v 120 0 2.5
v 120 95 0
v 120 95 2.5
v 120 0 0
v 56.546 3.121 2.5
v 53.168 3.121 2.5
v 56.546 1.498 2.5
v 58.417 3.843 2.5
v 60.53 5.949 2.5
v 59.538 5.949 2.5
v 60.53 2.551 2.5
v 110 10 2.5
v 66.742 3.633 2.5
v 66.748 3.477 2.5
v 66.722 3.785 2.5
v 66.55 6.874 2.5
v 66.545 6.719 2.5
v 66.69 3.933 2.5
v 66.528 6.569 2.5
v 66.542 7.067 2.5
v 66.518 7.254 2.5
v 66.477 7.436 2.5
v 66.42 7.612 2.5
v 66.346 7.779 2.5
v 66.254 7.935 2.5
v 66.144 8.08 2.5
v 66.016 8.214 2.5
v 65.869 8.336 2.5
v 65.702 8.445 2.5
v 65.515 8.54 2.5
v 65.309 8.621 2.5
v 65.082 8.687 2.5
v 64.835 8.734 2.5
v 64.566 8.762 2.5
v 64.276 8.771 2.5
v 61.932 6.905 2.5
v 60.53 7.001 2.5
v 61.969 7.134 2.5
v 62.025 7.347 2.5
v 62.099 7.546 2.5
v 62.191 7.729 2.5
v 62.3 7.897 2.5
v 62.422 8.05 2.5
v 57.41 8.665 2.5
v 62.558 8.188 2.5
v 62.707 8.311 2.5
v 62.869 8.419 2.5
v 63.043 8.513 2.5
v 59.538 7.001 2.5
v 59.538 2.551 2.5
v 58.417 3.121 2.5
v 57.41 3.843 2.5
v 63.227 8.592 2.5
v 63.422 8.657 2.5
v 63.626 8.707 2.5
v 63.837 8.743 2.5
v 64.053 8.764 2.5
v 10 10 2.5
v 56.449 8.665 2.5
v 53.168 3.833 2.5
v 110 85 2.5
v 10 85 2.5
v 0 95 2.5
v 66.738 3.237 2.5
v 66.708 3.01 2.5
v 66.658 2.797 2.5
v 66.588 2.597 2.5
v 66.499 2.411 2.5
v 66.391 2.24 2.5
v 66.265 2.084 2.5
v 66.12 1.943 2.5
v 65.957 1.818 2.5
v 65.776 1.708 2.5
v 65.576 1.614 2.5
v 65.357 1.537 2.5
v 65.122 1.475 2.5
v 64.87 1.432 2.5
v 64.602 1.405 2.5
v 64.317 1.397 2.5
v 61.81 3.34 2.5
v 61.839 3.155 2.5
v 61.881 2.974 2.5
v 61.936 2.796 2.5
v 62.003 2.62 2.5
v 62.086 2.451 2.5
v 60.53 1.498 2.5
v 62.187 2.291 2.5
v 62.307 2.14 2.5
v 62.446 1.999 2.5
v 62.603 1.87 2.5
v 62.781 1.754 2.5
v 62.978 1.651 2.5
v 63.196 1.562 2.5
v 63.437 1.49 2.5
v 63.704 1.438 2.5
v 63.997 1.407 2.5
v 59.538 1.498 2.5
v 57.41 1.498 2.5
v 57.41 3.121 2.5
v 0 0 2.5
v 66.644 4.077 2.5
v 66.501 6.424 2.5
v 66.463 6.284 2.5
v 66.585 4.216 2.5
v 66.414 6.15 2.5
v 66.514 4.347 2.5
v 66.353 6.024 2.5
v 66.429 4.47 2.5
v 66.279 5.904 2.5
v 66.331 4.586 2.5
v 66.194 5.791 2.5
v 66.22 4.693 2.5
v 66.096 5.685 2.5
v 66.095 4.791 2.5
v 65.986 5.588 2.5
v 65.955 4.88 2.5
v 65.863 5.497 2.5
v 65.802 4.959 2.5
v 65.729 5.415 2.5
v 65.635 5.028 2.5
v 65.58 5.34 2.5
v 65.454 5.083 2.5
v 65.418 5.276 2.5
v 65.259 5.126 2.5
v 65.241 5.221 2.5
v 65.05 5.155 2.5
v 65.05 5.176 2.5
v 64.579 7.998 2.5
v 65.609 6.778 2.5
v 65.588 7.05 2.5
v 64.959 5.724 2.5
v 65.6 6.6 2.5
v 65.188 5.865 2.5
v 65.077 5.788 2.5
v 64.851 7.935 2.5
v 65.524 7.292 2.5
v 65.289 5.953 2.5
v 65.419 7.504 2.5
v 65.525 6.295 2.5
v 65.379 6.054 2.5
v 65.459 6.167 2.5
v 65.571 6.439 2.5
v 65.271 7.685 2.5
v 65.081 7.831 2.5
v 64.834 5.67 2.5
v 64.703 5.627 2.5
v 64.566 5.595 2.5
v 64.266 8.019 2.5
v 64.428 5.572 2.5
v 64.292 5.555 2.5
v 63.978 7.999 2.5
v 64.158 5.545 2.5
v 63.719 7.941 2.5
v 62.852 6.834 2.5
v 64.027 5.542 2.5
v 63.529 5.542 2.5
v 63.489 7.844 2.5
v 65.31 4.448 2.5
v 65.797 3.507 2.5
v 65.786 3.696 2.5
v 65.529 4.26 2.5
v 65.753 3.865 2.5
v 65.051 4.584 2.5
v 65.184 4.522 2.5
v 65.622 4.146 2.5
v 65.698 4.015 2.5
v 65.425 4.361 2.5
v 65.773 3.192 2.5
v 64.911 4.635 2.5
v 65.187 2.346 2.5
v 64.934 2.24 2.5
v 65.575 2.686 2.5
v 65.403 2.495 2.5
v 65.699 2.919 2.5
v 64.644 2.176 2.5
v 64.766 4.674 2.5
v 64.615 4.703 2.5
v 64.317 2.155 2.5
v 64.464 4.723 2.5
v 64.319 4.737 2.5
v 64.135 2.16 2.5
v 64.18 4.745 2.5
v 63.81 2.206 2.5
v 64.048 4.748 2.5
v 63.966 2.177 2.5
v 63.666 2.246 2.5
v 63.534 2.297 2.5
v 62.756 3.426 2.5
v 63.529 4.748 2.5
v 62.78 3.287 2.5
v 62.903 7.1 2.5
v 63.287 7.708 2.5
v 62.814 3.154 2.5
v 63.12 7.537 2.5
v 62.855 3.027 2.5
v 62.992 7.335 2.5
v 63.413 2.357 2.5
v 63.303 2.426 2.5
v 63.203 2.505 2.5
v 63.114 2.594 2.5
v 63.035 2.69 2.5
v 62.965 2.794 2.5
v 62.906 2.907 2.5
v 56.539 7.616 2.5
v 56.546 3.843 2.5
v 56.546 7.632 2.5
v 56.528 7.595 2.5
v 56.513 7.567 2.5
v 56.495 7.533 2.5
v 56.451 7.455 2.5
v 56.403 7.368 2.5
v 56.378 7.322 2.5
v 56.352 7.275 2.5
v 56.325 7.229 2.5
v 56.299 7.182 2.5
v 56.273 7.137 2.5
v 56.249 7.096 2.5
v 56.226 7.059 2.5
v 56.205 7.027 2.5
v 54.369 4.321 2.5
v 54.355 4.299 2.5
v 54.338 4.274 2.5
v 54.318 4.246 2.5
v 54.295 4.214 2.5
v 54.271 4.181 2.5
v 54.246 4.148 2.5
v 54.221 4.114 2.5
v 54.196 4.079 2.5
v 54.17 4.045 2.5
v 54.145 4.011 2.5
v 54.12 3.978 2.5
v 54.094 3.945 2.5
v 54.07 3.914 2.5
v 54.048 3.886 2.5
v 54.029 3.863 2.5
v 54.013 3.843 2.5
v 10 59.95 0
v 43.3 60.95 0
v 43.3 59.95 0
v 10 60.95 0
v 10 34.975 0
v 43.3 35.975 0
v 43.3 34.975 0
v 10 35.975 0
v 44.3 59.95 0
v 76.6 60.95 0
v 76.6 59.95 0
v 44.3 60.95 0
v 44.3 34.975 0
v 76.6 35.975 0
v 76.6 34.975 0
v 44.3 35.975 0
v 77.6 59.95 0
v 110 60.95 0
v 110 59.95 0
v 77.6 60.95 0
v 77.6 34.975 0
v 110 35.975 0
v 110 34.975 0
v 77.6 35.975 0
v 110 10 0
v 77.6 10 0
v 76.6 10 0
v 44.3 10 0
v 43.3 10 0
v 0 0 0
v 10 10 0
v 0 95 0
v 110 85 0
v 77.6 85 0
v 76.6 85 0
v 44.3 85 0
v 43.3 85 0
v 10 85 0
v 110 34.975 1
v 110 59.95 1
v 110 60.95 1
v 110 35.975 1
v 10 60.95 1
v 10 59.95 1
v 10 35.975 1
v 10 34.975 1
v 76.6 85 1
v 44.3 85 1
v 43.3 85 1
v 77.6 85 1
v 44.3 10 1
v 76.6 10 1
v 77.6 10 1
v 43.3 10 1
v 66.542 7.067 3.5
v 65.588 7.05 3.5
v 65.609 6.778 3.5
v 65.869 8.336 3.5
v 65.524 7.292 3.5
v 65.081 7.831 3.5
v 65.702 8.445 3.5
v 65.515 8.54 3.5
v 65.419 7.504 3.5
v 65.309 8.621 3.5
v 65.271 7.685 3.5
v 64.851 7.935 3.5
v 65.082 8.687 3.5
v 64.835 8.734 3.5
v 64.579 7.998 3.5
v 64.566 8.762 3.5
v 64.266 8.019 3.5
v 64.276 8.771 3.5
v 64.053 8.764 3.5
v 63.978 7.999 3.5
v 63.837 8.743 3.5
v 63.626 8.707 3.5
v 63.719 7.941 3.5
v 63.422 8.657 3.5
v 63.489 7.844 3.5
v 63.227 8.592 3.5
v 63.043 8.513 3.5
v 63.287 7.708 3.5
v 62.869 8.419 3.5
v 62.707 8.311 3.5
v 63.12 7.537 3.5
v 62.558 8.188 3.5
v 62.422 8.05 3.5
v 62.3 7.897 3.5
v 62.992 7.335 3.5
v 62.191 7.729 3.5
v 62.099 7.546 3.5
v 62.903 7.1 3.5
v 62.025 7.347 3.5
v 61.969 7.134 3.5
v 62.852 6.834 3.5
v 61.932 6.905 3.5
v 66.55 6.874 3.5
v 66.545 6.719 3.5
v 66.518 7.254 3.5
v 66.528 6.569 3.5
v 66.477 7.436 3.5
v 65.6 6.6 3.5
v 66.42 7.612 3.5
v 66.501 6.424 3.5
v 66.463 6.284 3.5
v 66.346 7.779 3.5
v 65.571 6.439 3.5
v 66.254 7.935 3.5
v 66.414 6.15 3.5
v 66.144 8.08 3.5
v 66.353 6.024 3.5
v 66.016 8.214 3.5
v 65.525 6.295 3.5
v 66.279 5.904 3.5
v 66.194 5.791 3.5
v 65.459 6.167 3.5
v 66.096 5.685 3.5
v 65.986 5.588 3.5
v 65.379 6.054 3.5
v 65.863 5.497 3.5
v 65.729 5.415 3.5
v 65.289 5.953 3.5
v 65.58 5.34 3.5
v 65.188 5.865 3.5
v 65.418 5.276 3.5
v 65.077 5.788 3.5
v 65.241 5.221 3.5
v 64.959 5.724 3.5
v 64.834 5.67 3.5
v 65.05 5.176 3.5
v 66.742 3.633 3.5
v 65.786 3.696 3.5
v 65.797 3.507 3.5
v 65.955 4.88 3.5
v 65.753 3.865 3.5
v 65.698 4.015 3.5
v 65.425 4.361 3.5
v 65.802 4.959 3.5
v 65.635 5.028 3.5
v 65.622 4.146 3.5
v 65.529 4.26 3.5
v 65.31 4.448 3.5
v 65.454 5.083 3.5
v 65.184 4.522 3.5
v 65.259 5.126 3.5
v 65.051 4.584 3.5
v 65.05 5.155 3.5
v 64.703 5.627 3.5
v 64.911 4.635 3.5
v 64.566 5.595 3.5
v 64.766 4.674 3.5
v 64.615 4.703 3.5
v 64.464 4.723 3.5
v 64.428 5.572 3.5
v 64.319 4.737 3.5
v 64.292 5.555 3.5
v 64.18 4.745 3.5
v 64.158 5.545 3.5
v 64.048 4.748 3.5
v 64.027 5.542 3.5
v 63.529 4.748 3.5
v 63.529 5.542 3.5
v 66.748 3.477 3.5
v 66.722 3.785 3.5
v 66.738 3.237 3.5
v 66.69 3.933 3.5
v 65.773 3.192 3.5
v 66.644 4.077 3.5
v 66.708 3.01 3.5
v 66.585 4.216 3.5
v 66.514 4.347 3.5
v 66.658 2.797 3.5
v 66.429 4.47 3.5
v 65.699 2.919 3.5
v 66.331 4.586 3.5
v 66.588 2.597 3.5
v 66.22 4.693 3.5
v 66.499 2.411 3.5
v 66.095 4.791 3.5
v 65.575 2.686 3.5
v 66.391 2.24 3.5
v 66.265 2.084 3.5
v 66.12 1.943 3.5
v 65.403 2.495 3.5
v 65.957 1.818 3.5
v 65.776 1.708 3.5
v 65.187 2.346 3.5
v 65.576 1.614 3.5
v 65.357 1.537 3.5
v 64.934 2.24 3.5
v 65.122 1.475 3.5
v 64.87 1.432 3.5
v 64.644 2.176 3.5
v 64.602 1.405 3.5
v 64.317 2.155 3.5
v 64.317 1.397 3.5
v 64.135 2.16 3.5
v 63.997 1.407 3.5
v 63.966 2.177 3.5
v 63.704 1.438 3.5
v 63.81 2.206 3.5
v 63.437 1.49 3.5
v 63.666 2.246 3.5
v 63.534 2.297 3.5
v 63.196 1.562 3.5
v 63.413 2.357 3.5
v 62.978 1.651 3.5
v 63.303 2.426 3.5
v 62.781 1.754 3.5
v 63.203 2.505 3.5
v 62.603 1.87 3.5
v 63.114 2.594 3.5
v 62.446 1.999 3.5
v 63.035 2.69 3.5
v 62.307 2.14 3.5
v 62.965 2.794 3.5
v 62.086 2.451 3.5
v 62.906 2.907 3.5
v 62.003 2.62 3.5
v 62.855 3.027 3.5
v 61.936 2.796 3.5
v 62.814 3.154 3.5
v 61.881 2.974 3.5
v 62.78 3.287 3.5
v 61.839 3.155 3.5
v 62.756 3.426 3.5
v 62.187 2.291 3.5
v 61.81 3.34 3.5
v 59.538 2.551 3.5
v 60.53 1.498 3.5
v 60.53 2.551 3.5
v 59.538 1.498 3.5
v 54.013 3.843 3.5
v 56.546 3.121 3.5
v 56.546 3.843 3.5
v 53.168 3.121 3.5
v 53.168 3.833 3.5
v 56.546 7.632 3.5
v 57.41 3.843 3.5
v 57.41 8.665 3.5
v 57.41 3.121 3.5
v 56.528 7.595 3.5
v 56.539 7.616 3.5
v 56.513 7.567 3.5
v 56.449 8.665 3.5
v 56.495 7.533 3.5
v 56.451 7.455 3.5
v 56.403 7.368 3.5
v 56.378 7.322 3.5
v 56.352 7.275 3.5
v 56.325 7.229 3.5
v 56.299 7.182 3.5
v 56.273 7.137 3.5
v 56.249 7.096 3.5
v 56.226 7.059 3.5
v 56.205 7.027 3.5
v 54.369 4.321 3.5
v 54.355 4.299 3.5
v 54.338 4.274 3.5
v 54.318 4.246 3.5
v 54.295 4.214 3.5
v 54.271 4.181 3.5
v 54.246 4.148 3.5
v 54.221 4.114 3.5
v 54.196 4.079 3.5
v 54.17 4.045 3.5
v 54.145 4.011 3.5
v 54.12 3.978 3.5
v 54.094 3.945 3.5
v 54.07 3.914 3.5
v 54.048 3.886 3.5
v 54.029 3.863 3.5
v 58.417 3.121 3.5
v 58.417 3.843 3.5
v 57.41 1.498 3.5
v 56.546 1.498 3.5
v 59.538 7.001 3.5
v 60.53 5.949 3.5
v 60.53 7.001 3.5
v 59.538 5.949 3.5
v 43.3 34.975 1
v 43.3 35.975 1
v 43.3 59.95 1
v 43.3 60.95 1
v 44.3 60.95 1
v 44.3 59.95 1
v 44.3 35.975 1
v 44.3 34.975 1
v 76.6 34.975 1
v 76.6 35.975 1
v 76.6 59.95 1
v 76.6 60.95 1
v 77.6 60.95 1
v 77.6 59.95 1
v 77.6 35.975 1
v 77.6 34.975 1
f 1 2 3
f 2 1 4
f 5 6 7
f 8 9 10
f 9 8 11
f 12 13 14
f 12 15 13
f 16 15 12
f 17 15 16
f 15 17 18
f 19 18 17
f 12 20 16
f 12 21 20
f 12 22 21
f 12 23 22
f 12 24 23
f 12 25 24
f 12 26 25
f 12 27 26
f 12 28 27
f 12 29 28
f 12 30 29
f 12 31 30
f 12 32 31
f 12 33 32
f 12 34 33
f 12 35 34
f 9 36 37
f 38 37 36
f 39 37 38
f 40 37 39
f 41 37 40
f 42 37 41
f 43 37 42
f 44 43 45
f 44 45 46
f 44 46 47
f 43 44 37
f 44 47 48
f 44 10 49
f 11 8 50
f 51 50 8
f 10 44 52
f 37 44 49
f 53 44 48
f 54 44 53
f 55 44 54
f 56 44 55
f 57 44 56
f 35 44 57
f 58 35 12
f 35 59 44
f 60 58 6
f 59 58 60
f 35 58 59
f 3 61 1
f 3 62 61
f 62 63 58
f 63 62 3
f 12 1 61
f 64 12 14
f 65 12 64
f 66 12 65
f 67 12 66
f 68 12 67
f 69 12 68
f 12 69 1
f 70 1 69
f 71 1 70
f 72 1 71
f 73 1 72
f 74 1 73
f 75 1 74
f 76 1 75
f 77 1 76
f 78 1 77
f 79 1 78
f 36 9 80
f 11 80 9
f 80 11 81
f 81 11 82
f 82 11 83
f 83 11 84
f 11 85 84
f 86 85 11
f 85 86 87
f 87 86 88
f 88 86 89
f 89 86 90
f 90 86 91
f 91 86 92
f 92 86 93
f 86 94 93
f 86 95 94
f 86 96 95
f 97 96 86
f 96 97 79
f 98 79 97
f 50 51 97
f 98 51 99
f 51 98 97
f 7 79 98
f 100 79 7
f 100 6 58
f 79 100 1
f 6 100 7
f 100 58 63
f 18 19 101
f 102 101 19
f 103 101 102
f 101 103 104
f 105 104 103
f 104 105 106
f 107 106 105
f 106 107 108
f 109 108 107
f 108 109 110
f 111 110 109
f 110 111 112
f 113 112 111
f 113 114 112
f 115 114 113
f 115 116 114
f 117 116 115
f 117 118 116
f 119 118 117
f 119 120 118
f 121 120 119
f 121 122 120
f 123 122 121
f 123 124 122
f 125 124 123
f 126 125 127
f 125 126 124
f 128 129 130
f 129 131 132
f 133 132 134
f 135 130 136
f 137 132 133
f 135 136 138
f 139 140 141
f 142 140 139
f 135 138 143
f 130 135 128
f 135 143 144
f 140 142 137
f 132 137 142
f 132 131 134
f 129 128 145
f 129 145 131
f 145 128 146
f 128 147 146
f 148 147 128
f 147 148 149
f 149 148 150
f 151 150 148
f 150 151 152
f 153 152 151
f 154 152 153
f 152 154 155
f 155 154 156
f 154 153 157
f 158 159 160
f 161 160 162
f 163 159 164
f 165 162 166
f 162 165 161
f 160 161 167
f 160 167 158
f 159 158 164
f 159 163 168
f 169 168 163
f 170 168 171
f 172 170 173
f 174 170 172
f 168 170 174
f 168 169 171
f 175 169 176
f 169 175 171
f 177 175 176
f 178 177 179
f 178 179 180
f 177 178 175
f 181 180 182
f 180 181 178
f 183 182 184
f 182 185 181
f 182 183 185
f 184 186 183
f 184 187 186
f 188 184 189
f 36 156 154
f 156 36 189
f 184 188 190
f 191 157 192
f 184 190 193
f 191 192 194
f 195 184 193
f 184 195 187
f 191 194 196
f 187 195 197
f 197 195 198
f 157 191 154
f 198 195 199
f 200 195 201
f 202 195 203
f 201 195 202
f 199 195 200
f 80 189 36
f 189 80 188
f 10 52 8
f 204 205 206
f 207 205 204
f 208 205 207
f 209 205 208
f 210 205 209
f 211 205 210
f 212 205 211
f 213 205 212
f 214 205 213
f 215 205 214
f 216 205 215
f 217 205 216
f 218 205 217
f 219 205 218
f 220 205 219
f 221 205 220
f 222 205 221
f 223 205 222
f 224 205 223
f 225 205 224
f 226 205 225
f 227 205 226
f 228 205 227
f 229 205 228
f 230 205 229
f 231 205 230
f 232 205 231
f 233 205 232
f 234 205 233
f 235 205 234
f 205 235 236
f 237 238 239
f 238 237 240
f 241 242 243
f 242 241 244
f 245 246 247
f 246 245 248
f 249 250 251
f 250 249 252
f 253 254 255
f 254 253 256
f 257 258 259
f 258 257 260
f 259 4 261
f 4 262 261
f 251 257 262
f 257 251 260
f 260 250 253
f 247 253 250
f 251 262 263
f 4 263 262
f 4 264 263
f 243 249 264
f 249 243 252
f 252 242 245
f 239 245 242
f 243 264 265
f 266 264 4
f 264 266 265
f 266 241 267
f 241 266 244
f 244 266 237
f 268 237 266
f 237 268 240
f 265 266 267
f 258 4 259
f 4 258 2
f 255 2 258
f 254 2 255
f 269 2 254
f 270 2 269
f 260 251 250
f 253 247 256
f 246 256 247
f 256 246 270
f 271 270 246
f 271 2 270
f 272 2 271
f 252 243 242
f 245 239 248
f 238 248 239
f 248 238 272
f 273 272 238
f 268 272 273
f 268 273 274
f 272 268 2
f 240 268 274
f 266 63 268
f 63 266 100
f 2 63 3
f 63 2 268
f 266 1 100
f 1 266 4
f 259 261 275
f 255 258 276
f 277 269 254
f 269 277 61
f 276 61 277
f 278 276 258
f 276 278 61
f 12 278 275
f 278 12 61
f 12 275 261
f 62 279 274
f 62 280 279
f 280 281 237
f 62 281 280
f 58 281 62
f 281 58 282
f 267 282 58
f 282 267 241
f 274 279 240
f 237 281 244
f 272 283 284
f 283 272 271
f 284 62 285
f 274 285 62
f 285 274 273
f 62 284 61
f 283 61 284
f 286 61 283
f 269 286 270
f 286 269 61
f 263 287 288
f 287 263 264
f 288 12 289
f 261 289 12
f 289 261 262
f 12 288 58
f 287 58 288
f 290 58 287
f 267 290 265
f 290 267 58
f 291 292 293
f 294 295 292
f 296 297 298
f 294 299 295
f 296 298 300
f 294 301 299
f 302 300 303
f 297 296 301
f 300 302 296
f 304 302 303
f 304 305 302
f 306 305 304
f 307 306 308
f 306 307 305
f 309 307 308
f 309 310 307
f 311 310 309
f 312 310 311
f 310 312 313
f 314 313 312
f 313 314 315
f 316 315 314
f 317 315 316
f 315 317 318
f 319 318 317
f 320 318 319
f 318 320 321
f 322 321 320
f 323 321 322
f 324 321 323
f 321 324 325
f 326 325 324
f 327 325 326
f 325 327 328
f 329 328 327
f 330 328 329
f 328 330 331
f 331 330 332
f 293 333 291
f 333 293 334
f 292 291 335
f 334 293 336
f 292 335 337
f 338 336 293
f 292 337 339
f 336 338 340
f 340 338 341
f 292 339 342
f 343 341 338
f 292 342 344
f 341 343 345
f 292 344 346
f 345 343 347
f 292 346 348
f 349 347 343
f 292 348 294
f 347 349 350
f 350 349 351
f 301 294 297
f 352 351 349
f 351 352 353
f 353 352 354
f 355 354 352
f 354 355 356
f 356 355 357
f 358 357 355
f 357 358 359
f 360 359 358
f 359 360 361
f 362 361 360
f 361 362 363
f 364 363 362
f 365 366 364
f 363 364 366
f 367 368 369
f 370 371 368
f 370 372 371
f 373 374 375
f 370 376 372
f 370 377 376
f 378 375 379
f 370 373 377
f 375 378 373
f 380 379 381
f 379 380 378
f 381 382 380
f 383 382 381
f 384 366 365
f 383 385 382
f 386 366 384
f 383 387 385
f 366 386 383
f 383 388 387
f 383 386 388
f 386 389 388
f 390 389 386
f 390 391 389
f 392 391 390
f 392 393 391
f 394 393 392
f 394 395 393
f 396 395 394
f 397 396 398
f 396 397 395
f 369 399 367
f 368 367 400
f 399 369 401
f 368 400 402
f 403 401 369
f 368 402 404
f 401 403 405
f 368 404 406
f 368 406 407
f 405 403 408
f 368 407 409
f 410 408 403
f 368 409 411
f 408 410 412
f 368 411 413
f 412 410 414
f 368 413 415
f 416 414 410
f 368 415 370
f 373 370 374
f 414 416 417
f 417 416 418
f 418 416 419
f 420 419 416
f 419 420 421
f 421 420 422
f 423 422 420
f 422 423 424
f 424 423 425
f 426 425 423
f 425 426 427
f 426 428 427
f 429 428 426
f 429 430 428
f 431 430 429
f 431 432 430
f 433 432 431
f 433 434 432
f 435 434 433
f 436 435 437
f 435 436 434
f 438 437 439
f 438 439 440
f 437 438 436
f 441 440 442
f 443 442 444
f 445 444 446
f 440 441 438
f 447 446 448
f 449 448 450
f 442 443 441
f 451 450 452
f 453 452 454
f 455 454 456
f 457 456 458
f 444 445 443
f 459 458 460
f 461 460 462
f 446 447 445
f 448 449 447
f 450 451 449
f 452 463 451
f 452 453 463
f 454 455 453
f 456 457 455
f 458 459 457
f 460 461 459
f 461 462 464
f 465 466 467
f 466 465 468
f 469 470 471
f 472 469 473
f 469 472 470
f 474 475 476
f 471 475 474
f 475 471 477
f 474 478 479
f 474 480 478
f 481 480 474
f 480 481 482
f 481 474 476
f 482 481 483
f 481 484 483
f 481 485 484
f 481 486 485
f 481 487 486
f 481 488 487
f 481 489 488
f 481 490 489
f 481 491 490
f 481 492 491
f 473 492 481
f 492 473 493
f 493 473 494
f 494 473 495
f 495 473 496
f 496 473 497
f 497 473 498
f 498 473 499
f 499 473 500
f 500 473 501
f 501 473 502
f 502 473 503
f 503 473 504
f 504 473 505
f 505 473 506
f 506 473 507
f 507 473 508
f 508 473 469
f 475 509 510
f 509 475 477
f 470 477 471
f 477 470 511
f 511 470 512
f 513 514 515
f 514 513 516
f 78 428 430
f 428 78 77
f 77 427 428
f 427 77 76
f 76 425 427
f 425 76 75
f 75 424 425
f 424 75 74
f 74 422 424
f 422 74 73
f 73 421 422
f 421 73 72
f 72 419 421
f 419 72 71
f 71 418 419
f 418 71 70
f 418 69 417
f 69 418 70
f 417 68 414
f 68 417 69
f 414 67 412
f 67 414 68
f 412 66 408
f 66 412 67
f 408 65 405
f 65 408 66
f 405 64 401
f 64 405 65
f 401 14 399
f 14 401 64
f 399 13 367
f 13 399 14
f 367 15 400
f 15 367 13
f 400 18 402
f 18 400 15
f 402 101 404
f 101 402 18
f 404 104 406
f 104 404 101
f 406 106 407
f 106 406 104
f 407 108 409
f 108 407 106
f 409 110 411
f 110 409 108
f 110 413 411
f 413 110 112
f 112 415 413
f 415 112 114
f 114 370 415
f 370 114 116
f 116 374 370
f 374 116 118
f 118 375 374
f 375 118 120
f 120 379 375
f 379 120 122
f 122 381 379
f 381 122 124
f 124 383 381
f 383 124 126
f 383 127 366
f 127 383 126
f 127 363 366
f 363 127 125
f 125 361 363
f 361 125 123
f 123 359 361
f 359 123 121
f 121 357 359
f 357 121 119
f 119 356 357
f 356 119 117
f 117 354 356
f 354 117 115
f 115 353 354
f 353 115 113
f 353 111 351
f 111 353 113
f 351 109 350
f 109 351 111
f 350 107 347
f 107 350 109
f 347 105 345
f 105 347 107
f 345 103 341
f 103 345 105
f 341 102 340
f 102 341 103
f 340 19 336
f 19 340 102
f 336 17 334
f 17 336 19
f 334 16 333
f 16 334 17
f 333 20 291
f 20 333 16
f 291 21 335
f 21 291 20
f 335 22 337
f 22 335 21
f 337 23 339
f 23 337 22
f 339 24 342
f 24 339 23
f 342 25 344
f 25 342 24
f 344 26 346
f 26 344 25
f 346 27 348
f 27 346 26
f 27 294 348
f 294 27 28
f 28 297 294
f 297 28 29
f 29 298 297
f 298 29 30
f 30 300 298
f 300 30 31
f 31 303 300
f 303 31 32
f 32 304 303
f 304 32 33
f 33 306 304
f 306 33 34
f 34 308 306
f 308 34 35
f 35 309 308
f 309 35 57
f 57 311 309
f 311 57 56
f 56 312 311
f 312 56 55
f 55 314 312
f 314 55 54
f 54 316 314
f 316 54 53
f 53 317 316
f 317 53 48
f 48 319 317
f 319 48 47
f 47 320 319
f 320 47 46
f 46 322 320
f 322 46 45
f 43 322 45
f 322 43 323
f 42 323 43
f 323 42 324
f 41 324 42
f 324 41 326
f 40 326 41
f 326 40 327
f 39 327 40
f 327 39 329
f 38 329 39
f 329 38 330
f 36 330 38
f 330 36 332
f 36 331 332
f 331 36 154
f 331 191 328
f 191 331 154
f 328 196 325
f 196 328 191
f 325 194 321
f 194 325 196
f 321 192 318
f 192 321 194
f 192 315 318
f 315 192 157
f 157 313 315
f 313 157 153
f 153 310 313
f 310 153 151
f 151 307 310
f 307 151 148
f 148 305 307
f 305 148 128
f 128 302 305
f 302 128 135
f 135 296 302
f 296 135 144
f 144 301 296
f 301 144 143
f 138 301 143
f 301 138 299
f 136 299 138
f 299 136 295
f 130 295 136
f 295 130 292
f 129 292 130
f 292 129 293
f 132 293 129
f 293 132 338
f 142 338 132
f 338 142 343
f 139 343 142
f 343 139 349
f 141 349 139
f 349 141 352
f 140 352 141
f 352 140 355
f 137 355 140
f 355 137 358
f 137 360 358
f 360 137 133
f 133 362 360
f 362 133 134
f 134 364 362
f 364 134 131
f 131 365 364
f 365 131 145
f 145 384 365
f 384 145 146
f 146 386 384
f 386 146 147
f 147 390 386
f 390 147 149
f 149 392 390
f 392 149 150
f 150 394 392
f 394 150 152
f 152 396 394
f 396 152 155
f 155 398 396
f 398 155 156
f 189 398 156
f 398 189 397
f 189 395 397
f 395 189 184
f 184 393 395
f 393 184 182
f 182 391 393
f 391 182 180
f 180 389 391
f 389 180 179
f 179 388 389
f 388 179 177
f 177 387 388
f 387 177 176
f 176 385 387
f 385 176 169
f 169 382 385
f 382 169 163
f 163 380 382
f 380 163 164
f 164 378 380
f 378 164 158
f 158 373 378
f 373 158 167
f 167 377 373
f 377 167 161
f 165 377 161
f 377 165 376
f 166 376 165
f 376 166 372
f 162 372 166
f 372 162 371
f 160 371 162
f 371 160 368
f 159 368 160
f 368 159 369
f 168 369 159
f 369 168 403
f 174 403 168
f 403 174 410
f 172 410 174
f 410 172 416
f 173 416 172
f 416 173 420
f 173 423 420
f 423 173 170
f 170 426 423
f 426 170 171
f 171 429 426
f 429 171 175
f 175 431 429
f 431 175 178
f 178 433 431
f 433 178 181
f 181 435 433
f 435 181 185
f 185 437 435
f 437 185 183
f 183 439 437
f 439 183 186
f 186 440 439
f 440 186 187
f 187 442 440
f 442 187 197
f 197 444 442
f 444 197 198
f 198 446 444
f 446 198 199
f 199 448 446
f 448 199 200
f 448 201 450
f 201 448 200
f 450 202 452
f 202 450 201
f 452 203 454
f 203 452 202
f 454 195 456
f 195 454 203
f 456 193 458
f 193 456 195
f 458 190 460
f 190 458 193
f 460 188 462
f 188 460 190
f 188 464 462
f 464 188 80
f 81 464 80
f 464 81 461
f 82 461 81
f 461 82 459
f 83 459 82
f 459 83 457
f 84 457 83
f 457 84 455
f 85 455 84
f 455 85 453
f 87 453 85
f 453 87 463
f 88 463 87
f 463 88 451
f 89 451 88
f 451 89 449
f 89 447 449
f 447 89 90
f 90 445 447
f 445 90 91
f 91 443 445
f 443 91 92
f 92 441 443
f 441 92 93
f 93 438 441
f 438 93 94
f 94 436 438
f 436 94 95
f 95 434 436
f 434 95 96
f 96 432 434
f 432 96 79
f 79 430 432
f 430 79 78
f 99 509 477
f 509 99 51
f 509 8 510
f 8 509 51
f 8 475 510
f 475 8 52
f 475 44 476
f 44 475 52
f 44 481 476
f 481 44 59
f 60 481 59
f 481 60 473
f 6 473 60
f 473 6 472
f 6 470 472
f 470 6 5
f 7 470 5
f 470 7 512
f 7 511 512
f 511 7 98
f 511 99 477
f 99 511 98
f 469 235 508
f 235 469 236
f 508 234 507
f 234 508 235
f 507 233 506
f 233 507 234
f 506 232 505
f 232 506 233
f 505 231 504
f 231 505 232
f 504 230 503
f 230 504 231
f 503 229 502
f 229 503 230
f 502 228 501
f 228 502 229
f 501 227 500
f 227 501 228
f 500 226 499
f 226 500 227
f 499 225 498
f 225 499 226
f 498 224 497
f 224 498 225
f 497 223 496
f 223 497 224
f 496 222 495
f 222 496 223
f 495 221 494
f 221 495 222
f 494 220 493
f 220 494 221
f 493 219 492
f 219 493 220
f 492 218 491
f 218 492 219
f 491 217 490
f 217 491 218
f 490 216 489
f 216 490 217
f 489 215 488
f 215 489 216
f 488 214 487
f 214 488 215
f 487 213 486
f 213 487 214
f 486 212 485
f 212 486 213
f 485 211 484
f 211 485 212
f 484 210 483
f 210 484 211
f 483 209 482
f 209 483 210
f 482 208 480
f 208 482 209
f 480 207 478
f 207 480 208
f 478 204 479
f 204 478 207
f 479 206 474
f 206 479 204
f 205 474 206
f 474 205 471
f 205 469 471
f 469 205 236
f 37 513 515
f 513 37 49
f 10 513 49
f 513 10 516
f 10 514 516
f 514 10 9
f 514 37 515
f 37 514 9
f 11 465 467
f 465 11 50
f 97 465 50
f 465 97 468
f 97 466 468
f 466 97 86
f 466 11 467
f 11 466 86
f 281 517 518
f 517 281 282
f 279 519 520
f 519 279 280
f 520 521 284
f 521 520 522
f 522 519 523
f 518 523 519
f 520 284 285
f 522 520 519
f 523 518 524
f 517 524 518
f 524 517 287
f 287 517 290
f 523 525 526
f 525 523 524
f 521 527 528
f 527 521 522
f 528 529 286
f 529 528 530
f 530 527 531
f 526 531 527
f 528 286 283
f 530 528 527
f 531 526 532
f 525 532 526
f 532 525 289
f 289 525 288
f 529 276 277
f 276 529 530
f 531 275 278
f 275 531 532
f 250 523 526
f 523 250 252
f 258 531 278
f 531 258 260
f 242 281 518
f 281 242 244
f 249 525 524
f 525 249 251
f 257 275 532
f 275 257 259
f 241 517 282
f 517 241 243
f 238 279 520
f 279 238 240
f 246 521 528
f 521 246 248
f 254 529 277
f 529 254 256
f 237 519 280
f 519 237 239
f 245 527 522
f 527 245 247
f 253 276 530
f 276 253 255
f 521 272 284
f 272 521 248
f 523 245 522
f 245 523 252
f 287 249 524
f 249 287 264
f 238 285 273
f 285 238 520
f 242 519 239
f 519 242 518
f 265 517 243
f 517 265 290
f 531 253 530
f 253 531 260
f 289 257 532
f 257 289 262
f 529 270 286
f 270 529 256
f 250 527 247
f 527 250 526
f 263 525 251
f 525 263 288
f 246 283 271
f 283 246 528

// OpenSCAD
// Width of aspect ratio, 16 for 16x9.
asp_width = 4;

// Height of aspect ratio, 9 for 16x9.
asp_height = 3;

// Width of viewport in mm.
abs_width = 100;

// Thickness of frame in mm.
frame_thick = 10;

// Thickness of model along the z axis.
z_thick = 2.5;

// Calculated aspect ratio for calculating the height.
asp_ratio = asp_height/asp_width;
// Calculated outer width in mm
out_width = abs_width + (frame_thick * 2);
//Calculated outer height in mm
out_height = (abs_width*asp_ratio) + (frame_thick * 2);
//Calculated inner height in mm
in_height = abs_width*asp_ratio;

difference() {
    cube([out_width, out_height, z_thick]);
    
    translate([frame_thick,frame_thick,0])
        cube([abs_width, in_height, z_thick]);
}

translate([out_width/2,frame_thick/2,z_thick])
    linear_extrude(1)
    text(str(asp_width, ":", asp_height), valign="center", halign="center", size=frame_thick*.75);

translate([0,(in_height*.333)+frame_thick,0])
    cube([out_width,1,1]);

translate([0,(in_height*.666)+frame_thick,0])
    cube([out_width,1,1]);

translate([(abs_width*.333)+frame_thick,0,0])
    cube([1,out_height,1]);

translate([(abs_width*.666)+frame_thick,0,0])
    cube([1,out_height,1]);
